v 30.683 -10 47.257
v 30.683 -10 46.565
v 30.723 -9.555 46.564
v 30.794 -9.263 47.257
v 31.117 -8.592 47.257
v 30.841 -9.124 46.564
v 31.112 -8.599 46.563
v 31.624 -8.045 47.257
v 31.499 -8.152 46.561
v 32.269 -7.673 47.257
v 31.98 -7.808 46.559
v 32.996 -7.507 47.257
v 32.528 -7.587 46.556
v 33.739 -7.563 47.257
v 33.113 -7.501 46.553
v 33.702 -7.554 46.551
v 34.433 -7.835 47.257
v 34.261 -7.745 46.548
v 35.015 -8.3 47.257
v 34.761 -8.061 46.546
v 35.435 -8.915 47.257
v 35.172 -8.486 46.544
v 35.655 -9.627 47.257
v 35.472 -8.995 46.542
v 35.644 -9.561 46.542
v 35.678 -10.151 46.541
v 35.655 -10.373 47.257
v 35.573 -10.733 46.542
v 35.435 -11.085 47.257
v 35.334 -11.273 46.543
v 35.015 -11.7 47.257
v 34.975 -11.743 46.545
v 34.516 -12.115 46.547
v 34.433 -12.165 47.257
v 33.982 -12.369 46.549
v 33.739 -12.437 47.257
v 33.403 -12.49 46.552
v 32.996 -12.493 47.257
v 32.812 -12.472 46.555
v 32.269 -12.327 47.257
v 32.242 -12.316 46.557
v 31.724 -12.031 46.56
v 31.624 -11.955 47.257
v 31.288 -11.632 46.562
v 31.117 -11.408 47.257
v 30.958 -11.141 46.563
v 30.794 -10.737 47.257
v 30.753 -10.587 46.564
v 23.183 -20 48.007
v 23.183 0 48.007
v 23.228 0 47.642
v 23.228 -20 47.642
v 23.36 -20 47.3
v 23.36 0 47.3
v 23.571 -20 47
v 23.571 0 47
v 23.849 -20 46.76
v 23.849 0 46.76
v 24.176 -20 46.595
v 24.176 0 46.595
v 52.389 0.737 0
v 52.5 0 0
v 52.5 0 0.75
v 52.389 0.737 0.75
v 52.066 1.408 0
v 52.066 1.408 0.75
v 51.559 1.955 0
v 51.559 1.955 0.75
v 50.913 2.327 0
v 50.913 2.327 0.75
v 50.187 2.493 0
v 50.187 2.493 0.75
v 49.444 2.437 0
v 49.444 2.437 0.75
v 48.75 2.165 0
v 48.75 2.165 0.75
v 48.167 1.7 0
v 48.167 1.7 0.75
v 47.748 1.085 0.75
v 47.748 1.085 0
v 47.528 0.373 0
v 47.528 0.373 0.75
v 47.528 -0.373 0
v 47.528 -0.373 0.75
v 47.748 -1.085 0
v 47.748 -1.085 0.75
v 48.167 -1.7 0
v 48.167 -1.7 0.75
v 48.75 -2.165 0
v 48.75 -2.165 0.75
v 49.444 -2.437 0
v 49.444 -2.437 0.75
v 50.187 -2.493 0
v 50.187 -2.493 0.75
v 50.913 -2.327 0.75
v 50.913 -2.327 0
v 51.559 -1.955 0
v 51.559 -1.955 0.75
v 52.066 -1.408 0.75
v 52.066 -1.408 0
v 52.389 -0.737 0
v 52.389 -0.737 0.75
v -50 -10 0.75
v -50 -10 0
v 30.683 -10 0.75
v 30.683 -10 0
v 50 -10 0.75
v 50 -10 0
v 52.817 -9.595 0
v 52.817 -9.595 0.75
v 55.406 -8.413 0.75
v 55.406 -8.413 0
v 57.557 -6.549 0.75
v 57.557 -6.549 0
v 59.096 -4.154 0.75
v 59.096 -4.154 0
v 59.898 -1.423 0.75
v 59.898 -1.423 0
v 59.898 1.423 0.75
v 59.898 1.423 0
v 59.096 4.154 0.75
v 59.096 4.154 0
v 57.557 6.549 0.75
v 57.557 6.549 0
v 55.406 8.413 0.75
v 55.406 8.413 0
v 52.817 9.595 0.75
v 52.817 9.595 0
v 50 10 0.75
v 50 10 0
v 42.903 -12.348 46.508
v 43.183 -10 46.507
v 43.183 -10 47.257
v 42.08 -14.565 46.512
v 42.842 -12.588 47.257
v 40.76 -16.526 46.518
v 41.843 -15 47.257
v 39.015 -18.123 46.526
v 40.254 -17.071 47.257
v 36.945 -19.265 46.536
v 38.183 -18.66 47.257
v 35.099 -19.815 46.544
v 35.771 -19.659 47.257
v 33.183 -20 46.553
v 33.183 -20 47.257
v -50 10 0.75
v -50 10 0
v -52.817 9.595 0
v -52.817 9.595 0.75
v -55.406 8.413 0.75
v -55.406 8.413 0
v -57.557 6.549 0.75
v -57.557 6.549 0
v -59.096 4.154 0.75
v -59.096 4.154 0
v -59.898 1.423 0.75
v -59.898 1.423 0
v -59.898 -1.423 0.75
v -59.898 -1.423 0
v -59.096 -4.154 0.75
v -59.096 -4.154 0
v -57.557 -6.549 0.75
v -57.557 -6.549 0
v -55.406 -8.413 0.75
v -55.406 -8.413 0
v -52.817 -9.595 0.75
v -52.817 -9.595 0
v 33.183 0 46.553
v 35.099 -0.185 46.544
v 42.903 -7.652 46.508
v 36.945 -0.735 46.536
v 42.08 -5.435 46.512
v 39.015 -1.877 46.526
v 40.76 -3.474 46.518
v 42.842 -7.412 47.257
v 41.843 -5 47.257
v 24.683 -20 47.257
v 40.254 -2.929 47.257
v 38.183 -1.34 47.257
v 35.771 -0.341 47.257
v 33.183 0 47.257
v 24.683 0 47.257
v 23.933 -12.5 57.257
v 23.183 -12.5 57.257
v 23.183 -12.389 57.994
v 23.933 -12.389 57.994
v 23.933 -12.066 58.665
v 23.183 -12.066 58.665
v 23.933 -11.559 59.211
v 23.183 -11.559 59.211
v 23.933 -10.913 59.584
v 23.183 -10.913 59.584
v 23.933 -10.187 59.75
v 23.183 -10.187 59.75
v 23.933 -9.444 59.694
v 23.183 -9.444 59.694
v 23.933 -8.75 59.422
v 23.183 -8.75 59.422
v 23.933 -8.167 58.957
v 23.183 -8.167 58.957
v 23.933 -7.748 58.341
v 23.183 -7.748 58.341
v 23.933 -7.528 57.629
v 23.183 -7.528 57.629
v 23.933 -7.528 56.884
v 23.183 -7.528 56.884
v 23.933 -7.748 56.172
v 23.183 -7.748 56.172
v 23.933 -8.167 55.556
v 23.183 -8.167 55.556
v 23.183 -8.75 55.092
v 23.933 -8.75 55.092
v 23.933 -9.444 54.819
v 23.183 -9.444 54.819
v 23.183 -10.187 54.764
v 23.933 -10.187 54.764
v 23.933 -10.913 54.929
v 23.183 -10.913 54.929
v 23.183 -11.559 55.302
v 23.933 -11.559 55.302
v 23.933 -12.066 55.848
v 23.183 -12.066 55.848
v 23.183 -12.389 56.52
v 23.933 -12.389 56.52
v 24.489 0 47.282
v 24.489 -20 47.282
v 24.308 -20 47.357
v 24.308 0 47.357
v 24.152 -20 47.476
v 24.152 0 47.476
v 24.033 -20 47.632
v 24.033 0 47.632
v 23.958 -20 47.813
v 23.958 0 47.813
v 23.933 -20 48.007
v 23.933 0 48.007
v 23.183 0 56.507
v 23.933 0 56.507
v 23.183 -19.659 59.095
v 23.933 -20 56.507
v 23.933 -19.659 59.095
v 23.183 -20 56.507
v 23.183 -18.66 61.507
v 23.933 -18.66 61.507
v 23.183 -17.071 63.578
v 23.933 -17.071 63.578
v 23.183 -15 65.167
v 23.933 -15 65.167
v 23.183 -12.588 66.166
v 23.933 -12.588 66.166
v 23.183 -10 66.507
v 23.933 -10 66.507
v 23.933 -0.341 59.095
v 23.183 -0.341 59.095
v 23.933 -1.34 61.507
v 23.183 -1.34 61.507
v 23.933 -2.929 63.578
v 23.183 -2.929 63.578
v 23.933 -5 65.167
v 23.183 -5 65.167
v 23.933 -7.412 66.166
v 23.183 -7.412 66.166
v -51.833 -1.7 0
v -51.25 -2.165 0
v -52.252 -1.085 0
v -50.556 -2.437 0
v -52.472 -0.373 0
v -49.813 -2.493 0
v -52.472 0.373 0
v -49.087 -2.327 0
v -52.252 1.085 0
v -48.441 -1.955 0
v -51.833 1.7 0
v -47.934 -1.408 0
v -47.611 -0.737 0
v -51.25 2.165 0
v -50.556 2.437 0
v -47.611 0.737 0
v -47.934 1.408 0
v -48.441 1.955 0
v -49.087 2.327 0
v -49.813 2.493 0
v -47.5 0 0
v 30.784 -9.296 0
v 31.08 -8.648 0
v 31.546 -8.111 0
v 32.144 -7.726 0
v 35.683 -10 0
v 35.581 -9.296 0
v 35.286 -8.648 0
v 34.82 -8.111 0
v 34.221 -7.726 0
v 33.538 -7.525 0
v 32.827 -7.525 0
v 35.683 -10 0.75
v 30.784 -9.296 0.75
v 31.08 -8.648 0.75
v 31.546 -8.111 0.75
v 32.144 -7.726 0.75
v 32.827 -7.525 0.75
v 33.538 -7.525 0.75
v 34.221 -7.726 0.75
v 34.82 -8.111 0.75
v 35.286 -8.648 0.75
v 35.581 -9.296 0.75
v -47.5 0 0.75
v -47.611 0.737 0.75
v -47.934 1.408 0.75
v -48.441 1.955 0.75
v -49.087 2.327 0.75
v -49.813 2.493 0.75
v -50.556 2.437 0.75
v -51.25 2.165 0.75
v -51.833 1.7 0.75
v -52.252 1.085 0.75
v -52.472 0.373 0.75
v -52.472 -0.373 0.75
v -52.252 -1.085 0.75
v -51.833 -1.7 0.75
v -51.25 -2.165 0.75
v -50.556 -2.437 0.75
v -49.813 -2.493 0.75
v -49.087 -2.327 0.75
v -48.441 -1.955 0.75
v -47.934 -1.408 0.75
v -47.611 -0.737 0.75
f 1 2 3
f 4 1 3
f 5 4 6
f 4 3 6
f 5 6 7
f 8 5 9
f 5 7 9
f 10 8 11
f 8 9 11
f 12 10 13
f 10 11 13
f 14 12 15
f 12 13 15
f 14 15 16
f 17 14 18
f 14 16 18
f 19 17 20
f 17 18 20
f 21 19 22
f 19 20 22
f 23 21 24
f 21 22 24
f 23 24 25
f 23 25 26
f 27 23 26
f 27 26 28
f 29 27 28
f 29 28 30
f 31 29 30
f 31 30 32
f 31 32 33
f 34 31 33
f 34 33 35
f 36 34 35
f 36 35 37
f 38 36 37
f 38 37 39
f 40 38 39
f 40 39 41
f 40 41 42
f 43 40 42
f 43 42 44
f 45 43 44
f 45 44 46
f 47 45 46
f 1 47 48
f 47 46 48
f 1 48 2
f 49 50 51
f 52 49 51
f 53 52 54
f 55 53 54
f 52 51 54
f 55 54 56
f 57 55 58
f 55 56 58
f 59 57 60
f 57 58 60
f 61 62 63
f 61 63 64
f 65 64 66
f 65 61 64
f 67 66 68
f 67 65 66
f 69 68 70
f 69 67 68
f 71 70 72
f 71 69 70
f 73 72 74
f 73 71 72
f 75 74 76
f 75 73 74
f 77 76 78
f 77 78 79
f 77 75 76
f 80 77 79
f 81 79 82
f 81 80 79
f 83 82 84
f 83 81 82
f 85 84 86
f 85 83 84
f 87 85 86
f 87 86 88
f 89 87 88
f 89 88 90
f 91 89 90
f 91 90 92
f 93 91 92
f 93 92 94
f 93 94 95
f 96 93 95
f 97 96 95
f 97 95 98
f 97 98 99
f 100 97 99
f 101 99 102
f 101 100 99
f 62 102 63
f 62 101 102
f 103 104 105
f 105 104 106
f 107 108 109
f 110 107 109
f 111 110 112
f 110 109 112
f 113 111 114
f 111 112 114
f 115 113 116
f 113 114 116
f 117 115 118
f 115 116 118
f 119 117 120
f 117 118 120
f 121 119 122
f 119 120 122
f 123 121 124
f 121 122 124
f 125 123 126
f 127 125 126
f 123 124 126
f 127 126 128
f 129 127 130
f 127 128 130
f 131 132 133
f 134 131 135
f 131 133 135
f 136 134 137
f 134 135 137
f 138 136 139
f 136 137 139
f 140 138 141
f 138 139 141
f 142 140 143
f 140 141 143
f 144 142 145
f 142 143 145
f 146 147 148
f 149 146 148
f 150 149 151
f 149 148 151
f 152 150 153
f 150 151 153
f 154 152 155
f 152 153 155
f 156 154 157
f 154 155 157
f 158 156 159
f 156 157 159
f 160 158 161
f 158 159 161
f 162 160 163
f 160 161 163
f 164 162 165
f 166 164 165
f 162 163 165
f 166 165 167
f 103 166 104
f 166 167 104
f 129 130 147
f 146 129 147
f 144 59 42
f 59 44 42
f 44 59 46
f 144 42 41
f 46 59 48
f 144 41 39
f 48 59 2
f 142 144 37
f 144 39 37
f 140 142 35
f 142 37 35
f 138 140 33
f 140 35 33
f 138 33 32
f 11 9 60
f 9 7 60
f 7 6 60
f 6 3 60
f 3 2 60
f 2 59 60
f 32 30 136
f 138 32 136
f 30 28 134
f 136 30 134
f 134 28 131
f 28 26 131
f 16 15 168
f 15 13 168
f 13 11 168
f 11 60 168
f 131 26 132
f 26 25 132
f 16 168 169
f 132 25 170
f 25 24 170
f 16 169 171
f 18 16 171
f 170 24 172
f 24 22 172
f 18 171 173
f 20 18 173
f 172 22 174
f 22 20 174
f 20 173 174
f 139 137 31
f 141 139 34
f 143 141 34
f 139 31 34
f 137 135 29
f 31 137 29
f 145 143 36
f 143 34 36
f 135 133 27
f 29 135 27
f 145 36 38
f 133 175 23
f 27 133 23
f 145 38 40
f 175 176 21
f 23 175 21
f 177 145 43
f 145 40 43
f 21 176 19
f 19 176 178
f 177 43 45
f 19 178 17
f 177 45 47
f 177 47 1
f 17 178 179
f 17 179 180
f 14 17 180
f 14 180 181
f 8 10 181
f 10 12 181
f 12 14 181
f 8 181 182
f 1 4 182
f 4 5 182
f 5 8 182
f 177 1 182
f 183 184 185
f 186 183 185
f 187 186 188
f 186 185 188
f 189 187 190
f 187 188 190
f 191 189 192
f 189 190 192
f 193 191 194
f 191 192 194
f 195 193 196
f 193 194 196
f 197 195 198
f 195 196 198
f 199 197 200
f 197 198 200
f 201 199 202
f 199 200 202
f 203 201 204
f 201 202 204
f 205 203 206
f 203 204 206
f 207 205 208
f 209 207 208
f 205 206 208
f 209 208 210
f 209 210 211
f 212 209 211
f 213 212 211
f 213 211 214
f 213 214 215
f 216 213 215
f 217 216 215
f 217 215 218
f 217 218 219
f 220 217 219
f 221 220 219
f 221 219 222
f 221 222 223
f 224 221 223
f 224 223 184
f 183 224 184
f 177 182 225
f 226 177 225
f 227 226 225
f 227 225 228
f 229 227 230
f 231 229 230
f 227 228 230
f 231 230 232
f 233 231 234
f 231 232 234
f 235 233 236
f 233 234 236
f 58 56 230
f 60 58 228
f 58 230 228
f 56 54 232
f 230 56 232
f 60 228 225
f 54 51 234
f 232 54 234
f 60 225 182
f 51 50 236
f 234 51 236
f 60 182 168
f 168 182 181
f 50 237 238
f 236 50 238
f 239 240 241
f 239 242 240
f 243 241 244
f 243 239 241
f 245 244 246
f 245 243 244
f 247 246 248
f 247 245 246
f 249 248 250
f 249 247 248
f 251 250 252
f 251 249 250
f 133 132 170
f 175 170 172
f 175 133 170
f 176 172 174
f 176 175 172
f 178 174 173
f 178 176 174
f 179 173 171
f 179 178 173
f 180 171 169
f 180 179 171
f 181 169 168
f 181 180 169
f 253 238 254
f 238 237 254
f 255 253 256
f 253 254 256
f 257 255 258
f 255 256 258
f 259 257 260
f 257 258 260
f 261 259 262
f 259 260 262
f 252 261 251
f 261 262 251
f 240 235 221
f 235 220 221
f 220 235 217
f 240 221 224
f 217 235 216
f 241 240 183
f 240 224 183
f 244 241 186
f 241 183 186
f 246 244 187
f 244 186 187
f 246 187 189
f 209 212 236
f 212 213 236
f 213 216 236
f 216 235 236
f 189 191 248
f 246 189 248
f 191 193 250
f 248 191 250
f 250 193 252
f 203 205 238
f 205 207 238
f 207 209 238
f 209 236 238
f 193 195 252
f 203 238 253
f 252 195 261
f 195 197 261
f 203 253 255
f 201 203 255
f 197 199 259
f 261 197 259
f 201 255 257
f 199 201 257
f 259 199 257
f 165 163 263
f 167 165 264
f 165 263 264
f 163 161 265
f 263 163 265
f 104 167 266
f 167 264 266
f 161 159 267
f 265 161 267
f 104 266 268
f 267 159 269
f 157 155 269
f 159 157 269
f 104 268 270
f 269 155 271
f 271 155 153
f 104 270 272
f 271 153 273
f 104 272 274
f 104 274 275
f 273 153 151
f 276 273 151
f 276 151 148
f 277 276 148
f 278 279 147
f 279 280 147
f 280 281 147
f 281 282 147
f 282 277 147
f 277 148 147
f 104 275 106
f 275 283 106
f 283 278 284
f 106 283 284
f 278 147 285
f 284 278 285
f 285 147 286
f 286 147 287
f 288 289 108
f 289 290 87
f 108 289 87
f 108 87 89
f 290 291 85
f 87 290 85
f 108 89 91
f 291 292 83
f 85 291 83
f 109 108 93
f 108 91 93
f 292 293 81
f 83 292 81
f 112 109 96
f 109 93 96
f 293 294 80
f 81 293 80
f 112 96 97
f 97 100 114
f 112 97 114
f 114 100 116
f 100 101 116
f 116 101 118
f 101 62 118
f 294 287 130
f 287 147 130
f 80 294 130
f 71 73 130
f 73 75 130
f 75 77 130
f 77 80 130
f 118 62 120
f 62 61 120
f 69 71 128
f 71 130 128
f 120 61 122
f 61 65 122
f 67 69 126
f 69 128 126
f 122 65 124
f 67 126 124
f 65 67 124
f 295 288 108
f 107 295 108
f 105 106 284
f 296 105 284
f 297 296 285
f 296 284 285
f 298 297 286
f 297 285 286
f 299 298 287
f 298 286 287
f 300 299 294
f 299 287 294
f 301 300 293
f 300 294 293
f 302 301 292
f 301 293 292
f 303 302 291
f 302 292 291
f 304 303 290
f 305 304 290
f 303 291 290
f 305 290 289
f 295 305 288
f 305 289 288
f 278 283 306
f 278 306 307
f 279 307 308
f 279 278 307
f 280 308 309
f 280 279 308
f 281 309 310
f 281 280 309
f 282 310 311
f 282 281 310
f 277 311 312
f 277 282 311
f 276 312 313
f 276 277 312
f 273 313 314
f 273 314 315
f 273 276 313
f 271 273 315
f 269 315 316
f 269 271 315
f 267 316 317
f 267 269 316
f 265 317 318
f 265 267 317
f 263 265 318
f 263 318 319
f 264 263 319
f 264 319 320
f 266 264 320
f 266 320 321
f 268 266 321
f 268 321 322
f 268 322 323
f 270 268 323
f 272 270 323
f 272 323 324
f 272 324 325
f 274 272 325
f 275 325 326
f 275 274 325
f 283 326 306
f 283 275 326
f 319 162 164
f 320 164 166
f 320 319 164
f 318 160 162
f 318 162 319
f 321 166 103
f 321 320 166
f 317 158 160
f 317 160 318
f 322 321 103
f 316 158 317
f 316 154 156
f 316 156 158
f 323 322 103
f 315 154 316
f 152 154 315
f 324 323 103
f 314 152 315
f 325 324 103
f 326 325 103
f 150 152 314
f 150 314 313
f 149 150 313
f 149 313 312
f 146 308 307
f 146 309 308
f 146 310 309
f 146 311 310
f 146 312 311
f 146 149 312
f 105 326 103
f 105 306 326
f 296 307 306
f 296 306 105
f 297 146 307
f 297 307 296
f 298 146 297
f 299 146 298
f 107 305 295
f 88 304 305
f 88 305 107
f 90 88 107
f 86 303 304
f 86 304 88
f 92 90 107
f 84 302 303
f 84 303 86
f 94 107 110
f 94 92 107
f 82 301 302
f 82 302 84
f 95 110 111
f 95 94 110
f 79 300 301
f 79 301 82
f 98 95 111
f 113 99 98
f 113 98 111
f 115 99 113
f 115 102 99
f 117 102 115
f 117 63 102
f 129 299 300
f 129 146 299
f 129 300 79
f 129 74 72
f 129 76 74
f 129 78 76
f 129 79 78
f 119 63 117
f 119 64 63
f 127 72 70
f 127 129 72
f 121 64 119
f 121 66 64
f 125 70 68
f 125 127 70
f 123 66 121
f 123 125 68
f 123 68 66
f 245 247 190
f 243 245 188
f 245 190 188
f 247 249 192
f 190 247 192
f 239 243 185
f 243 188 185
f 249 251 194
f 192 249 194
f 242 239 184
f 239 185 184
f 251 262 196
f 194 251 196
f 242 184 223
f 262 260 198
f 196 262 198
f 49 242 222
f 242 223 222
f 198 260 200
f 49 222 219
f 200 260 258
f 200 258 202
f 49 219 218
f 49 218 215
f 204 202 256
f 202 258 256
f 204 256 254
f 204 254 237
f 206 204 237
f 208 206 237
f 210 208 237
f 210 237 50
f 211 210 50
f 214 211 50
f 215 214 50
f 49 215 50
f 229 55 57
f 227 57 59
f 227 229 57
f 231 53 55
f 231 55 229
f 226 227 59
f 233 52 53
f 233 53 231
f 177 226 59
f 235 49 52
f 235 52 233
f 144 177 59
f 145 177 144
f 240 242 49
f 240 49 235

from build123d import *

# Parameters (mm, degrees)
F0_R     = 2.5
F1_DEPTH = 0.75
F3_DEPTH = 20
F5_D     = 5
F5_2_D   = 5
F7_D     = 5
F8_R     = 9.99999


# Not quite as in the source:
# - a fillet or chamfer is up to 0.001 mm smaller than in the source, because OpenCascade refuses the exact size


with BuildPart() as f1:
    # F0 (on Top) → F1 (new body)
    with BuildSketch(Plane.XY):
        with BuildLine():
            ThreePointArc((50, -10), (60, 0), (50, 10))
            Line((50, 10), (-50, 10))
            ThreePointArc((-50, 10), (-60, 0), (-50, -10))
            Line((-50, -10), (50, -10))
        make_face()
        with Locations((-50, 0)):
            Circle(F0_R, mode=Mode.SUBTRACT)
        with Locations((50, 0)):
            Circle(F0_R, mode=Mode.SUBTRACT)
    extrude(amount=F1_DEPTH)

    # F5 (through all)
    with Locations(Plane.XY.offset(47.2566441149)):
        with Locations((33.1826669741, -10)):
            Hole(F5_D / 2)


with BuildPart() as f3:
    # F2 (on Front) → F3 (new body)
    with BuildSketch(Plane.XZ):
        with BuildLine():
            Line((43.1826669741, 47.2566441149), (24.6826669741, 47.2566441149))
            ThreePointArc((24.6826669741, 47.2566441149), (24.1523368882, 47.476314029), (23.9326669741, 48.0066441149))
            Line((23.9326669741, 48.0066441149), (23.9326669741, 66.5066441149))
            Line((23.9326669741, 66.5066441149), (23.1826669741, 66.5066441149))
            Line((23.1826669741, 66.5066441149), (23.1826669741, 48.0066441149))
            ThreePointArc((23.1826669741, 48.0066441149), (23.4559897983, 47.1433578897), (24.176351116, 46.5946794369))
            Line((24.176351116, 46.5946794369), (43.1826669741, 46.5066441149))
            Line((43.1826669741, 46.5066441149), (43.1826669741, 47.2566441149))
        make_face()
    extrude(amount=F3_DEPTH)

    # F5#2 (through all)
    with Locations(Plane.XY.offset(47.2566441149)):
        with Locations((33.1826669741, -10)):
            Hole(F5_2_D / 2)

    # F7 (through all)
    with Locations(Plane.YZ.offset(23.9326669741)):
        with Locations((-10, 57.2566441149)):
            Hole(F7_D / 2)

    # F8 (radius 10 in the source; OpenCascade refuses exactly that, so slightly less here)
    f8_edges = [f3.edges().sort_by_distance(p)[0] for p in [
        (23.557667, -20, 66.506644),
        (23.557667, 0, 66.506644),
        (43.182667, -20, 46.881644),
        (43.182667, 0, 46.881644),
    ]]
    fillet(f8_edges, radius=F8_R)


solid = Compound([f1.part, f3.part])
